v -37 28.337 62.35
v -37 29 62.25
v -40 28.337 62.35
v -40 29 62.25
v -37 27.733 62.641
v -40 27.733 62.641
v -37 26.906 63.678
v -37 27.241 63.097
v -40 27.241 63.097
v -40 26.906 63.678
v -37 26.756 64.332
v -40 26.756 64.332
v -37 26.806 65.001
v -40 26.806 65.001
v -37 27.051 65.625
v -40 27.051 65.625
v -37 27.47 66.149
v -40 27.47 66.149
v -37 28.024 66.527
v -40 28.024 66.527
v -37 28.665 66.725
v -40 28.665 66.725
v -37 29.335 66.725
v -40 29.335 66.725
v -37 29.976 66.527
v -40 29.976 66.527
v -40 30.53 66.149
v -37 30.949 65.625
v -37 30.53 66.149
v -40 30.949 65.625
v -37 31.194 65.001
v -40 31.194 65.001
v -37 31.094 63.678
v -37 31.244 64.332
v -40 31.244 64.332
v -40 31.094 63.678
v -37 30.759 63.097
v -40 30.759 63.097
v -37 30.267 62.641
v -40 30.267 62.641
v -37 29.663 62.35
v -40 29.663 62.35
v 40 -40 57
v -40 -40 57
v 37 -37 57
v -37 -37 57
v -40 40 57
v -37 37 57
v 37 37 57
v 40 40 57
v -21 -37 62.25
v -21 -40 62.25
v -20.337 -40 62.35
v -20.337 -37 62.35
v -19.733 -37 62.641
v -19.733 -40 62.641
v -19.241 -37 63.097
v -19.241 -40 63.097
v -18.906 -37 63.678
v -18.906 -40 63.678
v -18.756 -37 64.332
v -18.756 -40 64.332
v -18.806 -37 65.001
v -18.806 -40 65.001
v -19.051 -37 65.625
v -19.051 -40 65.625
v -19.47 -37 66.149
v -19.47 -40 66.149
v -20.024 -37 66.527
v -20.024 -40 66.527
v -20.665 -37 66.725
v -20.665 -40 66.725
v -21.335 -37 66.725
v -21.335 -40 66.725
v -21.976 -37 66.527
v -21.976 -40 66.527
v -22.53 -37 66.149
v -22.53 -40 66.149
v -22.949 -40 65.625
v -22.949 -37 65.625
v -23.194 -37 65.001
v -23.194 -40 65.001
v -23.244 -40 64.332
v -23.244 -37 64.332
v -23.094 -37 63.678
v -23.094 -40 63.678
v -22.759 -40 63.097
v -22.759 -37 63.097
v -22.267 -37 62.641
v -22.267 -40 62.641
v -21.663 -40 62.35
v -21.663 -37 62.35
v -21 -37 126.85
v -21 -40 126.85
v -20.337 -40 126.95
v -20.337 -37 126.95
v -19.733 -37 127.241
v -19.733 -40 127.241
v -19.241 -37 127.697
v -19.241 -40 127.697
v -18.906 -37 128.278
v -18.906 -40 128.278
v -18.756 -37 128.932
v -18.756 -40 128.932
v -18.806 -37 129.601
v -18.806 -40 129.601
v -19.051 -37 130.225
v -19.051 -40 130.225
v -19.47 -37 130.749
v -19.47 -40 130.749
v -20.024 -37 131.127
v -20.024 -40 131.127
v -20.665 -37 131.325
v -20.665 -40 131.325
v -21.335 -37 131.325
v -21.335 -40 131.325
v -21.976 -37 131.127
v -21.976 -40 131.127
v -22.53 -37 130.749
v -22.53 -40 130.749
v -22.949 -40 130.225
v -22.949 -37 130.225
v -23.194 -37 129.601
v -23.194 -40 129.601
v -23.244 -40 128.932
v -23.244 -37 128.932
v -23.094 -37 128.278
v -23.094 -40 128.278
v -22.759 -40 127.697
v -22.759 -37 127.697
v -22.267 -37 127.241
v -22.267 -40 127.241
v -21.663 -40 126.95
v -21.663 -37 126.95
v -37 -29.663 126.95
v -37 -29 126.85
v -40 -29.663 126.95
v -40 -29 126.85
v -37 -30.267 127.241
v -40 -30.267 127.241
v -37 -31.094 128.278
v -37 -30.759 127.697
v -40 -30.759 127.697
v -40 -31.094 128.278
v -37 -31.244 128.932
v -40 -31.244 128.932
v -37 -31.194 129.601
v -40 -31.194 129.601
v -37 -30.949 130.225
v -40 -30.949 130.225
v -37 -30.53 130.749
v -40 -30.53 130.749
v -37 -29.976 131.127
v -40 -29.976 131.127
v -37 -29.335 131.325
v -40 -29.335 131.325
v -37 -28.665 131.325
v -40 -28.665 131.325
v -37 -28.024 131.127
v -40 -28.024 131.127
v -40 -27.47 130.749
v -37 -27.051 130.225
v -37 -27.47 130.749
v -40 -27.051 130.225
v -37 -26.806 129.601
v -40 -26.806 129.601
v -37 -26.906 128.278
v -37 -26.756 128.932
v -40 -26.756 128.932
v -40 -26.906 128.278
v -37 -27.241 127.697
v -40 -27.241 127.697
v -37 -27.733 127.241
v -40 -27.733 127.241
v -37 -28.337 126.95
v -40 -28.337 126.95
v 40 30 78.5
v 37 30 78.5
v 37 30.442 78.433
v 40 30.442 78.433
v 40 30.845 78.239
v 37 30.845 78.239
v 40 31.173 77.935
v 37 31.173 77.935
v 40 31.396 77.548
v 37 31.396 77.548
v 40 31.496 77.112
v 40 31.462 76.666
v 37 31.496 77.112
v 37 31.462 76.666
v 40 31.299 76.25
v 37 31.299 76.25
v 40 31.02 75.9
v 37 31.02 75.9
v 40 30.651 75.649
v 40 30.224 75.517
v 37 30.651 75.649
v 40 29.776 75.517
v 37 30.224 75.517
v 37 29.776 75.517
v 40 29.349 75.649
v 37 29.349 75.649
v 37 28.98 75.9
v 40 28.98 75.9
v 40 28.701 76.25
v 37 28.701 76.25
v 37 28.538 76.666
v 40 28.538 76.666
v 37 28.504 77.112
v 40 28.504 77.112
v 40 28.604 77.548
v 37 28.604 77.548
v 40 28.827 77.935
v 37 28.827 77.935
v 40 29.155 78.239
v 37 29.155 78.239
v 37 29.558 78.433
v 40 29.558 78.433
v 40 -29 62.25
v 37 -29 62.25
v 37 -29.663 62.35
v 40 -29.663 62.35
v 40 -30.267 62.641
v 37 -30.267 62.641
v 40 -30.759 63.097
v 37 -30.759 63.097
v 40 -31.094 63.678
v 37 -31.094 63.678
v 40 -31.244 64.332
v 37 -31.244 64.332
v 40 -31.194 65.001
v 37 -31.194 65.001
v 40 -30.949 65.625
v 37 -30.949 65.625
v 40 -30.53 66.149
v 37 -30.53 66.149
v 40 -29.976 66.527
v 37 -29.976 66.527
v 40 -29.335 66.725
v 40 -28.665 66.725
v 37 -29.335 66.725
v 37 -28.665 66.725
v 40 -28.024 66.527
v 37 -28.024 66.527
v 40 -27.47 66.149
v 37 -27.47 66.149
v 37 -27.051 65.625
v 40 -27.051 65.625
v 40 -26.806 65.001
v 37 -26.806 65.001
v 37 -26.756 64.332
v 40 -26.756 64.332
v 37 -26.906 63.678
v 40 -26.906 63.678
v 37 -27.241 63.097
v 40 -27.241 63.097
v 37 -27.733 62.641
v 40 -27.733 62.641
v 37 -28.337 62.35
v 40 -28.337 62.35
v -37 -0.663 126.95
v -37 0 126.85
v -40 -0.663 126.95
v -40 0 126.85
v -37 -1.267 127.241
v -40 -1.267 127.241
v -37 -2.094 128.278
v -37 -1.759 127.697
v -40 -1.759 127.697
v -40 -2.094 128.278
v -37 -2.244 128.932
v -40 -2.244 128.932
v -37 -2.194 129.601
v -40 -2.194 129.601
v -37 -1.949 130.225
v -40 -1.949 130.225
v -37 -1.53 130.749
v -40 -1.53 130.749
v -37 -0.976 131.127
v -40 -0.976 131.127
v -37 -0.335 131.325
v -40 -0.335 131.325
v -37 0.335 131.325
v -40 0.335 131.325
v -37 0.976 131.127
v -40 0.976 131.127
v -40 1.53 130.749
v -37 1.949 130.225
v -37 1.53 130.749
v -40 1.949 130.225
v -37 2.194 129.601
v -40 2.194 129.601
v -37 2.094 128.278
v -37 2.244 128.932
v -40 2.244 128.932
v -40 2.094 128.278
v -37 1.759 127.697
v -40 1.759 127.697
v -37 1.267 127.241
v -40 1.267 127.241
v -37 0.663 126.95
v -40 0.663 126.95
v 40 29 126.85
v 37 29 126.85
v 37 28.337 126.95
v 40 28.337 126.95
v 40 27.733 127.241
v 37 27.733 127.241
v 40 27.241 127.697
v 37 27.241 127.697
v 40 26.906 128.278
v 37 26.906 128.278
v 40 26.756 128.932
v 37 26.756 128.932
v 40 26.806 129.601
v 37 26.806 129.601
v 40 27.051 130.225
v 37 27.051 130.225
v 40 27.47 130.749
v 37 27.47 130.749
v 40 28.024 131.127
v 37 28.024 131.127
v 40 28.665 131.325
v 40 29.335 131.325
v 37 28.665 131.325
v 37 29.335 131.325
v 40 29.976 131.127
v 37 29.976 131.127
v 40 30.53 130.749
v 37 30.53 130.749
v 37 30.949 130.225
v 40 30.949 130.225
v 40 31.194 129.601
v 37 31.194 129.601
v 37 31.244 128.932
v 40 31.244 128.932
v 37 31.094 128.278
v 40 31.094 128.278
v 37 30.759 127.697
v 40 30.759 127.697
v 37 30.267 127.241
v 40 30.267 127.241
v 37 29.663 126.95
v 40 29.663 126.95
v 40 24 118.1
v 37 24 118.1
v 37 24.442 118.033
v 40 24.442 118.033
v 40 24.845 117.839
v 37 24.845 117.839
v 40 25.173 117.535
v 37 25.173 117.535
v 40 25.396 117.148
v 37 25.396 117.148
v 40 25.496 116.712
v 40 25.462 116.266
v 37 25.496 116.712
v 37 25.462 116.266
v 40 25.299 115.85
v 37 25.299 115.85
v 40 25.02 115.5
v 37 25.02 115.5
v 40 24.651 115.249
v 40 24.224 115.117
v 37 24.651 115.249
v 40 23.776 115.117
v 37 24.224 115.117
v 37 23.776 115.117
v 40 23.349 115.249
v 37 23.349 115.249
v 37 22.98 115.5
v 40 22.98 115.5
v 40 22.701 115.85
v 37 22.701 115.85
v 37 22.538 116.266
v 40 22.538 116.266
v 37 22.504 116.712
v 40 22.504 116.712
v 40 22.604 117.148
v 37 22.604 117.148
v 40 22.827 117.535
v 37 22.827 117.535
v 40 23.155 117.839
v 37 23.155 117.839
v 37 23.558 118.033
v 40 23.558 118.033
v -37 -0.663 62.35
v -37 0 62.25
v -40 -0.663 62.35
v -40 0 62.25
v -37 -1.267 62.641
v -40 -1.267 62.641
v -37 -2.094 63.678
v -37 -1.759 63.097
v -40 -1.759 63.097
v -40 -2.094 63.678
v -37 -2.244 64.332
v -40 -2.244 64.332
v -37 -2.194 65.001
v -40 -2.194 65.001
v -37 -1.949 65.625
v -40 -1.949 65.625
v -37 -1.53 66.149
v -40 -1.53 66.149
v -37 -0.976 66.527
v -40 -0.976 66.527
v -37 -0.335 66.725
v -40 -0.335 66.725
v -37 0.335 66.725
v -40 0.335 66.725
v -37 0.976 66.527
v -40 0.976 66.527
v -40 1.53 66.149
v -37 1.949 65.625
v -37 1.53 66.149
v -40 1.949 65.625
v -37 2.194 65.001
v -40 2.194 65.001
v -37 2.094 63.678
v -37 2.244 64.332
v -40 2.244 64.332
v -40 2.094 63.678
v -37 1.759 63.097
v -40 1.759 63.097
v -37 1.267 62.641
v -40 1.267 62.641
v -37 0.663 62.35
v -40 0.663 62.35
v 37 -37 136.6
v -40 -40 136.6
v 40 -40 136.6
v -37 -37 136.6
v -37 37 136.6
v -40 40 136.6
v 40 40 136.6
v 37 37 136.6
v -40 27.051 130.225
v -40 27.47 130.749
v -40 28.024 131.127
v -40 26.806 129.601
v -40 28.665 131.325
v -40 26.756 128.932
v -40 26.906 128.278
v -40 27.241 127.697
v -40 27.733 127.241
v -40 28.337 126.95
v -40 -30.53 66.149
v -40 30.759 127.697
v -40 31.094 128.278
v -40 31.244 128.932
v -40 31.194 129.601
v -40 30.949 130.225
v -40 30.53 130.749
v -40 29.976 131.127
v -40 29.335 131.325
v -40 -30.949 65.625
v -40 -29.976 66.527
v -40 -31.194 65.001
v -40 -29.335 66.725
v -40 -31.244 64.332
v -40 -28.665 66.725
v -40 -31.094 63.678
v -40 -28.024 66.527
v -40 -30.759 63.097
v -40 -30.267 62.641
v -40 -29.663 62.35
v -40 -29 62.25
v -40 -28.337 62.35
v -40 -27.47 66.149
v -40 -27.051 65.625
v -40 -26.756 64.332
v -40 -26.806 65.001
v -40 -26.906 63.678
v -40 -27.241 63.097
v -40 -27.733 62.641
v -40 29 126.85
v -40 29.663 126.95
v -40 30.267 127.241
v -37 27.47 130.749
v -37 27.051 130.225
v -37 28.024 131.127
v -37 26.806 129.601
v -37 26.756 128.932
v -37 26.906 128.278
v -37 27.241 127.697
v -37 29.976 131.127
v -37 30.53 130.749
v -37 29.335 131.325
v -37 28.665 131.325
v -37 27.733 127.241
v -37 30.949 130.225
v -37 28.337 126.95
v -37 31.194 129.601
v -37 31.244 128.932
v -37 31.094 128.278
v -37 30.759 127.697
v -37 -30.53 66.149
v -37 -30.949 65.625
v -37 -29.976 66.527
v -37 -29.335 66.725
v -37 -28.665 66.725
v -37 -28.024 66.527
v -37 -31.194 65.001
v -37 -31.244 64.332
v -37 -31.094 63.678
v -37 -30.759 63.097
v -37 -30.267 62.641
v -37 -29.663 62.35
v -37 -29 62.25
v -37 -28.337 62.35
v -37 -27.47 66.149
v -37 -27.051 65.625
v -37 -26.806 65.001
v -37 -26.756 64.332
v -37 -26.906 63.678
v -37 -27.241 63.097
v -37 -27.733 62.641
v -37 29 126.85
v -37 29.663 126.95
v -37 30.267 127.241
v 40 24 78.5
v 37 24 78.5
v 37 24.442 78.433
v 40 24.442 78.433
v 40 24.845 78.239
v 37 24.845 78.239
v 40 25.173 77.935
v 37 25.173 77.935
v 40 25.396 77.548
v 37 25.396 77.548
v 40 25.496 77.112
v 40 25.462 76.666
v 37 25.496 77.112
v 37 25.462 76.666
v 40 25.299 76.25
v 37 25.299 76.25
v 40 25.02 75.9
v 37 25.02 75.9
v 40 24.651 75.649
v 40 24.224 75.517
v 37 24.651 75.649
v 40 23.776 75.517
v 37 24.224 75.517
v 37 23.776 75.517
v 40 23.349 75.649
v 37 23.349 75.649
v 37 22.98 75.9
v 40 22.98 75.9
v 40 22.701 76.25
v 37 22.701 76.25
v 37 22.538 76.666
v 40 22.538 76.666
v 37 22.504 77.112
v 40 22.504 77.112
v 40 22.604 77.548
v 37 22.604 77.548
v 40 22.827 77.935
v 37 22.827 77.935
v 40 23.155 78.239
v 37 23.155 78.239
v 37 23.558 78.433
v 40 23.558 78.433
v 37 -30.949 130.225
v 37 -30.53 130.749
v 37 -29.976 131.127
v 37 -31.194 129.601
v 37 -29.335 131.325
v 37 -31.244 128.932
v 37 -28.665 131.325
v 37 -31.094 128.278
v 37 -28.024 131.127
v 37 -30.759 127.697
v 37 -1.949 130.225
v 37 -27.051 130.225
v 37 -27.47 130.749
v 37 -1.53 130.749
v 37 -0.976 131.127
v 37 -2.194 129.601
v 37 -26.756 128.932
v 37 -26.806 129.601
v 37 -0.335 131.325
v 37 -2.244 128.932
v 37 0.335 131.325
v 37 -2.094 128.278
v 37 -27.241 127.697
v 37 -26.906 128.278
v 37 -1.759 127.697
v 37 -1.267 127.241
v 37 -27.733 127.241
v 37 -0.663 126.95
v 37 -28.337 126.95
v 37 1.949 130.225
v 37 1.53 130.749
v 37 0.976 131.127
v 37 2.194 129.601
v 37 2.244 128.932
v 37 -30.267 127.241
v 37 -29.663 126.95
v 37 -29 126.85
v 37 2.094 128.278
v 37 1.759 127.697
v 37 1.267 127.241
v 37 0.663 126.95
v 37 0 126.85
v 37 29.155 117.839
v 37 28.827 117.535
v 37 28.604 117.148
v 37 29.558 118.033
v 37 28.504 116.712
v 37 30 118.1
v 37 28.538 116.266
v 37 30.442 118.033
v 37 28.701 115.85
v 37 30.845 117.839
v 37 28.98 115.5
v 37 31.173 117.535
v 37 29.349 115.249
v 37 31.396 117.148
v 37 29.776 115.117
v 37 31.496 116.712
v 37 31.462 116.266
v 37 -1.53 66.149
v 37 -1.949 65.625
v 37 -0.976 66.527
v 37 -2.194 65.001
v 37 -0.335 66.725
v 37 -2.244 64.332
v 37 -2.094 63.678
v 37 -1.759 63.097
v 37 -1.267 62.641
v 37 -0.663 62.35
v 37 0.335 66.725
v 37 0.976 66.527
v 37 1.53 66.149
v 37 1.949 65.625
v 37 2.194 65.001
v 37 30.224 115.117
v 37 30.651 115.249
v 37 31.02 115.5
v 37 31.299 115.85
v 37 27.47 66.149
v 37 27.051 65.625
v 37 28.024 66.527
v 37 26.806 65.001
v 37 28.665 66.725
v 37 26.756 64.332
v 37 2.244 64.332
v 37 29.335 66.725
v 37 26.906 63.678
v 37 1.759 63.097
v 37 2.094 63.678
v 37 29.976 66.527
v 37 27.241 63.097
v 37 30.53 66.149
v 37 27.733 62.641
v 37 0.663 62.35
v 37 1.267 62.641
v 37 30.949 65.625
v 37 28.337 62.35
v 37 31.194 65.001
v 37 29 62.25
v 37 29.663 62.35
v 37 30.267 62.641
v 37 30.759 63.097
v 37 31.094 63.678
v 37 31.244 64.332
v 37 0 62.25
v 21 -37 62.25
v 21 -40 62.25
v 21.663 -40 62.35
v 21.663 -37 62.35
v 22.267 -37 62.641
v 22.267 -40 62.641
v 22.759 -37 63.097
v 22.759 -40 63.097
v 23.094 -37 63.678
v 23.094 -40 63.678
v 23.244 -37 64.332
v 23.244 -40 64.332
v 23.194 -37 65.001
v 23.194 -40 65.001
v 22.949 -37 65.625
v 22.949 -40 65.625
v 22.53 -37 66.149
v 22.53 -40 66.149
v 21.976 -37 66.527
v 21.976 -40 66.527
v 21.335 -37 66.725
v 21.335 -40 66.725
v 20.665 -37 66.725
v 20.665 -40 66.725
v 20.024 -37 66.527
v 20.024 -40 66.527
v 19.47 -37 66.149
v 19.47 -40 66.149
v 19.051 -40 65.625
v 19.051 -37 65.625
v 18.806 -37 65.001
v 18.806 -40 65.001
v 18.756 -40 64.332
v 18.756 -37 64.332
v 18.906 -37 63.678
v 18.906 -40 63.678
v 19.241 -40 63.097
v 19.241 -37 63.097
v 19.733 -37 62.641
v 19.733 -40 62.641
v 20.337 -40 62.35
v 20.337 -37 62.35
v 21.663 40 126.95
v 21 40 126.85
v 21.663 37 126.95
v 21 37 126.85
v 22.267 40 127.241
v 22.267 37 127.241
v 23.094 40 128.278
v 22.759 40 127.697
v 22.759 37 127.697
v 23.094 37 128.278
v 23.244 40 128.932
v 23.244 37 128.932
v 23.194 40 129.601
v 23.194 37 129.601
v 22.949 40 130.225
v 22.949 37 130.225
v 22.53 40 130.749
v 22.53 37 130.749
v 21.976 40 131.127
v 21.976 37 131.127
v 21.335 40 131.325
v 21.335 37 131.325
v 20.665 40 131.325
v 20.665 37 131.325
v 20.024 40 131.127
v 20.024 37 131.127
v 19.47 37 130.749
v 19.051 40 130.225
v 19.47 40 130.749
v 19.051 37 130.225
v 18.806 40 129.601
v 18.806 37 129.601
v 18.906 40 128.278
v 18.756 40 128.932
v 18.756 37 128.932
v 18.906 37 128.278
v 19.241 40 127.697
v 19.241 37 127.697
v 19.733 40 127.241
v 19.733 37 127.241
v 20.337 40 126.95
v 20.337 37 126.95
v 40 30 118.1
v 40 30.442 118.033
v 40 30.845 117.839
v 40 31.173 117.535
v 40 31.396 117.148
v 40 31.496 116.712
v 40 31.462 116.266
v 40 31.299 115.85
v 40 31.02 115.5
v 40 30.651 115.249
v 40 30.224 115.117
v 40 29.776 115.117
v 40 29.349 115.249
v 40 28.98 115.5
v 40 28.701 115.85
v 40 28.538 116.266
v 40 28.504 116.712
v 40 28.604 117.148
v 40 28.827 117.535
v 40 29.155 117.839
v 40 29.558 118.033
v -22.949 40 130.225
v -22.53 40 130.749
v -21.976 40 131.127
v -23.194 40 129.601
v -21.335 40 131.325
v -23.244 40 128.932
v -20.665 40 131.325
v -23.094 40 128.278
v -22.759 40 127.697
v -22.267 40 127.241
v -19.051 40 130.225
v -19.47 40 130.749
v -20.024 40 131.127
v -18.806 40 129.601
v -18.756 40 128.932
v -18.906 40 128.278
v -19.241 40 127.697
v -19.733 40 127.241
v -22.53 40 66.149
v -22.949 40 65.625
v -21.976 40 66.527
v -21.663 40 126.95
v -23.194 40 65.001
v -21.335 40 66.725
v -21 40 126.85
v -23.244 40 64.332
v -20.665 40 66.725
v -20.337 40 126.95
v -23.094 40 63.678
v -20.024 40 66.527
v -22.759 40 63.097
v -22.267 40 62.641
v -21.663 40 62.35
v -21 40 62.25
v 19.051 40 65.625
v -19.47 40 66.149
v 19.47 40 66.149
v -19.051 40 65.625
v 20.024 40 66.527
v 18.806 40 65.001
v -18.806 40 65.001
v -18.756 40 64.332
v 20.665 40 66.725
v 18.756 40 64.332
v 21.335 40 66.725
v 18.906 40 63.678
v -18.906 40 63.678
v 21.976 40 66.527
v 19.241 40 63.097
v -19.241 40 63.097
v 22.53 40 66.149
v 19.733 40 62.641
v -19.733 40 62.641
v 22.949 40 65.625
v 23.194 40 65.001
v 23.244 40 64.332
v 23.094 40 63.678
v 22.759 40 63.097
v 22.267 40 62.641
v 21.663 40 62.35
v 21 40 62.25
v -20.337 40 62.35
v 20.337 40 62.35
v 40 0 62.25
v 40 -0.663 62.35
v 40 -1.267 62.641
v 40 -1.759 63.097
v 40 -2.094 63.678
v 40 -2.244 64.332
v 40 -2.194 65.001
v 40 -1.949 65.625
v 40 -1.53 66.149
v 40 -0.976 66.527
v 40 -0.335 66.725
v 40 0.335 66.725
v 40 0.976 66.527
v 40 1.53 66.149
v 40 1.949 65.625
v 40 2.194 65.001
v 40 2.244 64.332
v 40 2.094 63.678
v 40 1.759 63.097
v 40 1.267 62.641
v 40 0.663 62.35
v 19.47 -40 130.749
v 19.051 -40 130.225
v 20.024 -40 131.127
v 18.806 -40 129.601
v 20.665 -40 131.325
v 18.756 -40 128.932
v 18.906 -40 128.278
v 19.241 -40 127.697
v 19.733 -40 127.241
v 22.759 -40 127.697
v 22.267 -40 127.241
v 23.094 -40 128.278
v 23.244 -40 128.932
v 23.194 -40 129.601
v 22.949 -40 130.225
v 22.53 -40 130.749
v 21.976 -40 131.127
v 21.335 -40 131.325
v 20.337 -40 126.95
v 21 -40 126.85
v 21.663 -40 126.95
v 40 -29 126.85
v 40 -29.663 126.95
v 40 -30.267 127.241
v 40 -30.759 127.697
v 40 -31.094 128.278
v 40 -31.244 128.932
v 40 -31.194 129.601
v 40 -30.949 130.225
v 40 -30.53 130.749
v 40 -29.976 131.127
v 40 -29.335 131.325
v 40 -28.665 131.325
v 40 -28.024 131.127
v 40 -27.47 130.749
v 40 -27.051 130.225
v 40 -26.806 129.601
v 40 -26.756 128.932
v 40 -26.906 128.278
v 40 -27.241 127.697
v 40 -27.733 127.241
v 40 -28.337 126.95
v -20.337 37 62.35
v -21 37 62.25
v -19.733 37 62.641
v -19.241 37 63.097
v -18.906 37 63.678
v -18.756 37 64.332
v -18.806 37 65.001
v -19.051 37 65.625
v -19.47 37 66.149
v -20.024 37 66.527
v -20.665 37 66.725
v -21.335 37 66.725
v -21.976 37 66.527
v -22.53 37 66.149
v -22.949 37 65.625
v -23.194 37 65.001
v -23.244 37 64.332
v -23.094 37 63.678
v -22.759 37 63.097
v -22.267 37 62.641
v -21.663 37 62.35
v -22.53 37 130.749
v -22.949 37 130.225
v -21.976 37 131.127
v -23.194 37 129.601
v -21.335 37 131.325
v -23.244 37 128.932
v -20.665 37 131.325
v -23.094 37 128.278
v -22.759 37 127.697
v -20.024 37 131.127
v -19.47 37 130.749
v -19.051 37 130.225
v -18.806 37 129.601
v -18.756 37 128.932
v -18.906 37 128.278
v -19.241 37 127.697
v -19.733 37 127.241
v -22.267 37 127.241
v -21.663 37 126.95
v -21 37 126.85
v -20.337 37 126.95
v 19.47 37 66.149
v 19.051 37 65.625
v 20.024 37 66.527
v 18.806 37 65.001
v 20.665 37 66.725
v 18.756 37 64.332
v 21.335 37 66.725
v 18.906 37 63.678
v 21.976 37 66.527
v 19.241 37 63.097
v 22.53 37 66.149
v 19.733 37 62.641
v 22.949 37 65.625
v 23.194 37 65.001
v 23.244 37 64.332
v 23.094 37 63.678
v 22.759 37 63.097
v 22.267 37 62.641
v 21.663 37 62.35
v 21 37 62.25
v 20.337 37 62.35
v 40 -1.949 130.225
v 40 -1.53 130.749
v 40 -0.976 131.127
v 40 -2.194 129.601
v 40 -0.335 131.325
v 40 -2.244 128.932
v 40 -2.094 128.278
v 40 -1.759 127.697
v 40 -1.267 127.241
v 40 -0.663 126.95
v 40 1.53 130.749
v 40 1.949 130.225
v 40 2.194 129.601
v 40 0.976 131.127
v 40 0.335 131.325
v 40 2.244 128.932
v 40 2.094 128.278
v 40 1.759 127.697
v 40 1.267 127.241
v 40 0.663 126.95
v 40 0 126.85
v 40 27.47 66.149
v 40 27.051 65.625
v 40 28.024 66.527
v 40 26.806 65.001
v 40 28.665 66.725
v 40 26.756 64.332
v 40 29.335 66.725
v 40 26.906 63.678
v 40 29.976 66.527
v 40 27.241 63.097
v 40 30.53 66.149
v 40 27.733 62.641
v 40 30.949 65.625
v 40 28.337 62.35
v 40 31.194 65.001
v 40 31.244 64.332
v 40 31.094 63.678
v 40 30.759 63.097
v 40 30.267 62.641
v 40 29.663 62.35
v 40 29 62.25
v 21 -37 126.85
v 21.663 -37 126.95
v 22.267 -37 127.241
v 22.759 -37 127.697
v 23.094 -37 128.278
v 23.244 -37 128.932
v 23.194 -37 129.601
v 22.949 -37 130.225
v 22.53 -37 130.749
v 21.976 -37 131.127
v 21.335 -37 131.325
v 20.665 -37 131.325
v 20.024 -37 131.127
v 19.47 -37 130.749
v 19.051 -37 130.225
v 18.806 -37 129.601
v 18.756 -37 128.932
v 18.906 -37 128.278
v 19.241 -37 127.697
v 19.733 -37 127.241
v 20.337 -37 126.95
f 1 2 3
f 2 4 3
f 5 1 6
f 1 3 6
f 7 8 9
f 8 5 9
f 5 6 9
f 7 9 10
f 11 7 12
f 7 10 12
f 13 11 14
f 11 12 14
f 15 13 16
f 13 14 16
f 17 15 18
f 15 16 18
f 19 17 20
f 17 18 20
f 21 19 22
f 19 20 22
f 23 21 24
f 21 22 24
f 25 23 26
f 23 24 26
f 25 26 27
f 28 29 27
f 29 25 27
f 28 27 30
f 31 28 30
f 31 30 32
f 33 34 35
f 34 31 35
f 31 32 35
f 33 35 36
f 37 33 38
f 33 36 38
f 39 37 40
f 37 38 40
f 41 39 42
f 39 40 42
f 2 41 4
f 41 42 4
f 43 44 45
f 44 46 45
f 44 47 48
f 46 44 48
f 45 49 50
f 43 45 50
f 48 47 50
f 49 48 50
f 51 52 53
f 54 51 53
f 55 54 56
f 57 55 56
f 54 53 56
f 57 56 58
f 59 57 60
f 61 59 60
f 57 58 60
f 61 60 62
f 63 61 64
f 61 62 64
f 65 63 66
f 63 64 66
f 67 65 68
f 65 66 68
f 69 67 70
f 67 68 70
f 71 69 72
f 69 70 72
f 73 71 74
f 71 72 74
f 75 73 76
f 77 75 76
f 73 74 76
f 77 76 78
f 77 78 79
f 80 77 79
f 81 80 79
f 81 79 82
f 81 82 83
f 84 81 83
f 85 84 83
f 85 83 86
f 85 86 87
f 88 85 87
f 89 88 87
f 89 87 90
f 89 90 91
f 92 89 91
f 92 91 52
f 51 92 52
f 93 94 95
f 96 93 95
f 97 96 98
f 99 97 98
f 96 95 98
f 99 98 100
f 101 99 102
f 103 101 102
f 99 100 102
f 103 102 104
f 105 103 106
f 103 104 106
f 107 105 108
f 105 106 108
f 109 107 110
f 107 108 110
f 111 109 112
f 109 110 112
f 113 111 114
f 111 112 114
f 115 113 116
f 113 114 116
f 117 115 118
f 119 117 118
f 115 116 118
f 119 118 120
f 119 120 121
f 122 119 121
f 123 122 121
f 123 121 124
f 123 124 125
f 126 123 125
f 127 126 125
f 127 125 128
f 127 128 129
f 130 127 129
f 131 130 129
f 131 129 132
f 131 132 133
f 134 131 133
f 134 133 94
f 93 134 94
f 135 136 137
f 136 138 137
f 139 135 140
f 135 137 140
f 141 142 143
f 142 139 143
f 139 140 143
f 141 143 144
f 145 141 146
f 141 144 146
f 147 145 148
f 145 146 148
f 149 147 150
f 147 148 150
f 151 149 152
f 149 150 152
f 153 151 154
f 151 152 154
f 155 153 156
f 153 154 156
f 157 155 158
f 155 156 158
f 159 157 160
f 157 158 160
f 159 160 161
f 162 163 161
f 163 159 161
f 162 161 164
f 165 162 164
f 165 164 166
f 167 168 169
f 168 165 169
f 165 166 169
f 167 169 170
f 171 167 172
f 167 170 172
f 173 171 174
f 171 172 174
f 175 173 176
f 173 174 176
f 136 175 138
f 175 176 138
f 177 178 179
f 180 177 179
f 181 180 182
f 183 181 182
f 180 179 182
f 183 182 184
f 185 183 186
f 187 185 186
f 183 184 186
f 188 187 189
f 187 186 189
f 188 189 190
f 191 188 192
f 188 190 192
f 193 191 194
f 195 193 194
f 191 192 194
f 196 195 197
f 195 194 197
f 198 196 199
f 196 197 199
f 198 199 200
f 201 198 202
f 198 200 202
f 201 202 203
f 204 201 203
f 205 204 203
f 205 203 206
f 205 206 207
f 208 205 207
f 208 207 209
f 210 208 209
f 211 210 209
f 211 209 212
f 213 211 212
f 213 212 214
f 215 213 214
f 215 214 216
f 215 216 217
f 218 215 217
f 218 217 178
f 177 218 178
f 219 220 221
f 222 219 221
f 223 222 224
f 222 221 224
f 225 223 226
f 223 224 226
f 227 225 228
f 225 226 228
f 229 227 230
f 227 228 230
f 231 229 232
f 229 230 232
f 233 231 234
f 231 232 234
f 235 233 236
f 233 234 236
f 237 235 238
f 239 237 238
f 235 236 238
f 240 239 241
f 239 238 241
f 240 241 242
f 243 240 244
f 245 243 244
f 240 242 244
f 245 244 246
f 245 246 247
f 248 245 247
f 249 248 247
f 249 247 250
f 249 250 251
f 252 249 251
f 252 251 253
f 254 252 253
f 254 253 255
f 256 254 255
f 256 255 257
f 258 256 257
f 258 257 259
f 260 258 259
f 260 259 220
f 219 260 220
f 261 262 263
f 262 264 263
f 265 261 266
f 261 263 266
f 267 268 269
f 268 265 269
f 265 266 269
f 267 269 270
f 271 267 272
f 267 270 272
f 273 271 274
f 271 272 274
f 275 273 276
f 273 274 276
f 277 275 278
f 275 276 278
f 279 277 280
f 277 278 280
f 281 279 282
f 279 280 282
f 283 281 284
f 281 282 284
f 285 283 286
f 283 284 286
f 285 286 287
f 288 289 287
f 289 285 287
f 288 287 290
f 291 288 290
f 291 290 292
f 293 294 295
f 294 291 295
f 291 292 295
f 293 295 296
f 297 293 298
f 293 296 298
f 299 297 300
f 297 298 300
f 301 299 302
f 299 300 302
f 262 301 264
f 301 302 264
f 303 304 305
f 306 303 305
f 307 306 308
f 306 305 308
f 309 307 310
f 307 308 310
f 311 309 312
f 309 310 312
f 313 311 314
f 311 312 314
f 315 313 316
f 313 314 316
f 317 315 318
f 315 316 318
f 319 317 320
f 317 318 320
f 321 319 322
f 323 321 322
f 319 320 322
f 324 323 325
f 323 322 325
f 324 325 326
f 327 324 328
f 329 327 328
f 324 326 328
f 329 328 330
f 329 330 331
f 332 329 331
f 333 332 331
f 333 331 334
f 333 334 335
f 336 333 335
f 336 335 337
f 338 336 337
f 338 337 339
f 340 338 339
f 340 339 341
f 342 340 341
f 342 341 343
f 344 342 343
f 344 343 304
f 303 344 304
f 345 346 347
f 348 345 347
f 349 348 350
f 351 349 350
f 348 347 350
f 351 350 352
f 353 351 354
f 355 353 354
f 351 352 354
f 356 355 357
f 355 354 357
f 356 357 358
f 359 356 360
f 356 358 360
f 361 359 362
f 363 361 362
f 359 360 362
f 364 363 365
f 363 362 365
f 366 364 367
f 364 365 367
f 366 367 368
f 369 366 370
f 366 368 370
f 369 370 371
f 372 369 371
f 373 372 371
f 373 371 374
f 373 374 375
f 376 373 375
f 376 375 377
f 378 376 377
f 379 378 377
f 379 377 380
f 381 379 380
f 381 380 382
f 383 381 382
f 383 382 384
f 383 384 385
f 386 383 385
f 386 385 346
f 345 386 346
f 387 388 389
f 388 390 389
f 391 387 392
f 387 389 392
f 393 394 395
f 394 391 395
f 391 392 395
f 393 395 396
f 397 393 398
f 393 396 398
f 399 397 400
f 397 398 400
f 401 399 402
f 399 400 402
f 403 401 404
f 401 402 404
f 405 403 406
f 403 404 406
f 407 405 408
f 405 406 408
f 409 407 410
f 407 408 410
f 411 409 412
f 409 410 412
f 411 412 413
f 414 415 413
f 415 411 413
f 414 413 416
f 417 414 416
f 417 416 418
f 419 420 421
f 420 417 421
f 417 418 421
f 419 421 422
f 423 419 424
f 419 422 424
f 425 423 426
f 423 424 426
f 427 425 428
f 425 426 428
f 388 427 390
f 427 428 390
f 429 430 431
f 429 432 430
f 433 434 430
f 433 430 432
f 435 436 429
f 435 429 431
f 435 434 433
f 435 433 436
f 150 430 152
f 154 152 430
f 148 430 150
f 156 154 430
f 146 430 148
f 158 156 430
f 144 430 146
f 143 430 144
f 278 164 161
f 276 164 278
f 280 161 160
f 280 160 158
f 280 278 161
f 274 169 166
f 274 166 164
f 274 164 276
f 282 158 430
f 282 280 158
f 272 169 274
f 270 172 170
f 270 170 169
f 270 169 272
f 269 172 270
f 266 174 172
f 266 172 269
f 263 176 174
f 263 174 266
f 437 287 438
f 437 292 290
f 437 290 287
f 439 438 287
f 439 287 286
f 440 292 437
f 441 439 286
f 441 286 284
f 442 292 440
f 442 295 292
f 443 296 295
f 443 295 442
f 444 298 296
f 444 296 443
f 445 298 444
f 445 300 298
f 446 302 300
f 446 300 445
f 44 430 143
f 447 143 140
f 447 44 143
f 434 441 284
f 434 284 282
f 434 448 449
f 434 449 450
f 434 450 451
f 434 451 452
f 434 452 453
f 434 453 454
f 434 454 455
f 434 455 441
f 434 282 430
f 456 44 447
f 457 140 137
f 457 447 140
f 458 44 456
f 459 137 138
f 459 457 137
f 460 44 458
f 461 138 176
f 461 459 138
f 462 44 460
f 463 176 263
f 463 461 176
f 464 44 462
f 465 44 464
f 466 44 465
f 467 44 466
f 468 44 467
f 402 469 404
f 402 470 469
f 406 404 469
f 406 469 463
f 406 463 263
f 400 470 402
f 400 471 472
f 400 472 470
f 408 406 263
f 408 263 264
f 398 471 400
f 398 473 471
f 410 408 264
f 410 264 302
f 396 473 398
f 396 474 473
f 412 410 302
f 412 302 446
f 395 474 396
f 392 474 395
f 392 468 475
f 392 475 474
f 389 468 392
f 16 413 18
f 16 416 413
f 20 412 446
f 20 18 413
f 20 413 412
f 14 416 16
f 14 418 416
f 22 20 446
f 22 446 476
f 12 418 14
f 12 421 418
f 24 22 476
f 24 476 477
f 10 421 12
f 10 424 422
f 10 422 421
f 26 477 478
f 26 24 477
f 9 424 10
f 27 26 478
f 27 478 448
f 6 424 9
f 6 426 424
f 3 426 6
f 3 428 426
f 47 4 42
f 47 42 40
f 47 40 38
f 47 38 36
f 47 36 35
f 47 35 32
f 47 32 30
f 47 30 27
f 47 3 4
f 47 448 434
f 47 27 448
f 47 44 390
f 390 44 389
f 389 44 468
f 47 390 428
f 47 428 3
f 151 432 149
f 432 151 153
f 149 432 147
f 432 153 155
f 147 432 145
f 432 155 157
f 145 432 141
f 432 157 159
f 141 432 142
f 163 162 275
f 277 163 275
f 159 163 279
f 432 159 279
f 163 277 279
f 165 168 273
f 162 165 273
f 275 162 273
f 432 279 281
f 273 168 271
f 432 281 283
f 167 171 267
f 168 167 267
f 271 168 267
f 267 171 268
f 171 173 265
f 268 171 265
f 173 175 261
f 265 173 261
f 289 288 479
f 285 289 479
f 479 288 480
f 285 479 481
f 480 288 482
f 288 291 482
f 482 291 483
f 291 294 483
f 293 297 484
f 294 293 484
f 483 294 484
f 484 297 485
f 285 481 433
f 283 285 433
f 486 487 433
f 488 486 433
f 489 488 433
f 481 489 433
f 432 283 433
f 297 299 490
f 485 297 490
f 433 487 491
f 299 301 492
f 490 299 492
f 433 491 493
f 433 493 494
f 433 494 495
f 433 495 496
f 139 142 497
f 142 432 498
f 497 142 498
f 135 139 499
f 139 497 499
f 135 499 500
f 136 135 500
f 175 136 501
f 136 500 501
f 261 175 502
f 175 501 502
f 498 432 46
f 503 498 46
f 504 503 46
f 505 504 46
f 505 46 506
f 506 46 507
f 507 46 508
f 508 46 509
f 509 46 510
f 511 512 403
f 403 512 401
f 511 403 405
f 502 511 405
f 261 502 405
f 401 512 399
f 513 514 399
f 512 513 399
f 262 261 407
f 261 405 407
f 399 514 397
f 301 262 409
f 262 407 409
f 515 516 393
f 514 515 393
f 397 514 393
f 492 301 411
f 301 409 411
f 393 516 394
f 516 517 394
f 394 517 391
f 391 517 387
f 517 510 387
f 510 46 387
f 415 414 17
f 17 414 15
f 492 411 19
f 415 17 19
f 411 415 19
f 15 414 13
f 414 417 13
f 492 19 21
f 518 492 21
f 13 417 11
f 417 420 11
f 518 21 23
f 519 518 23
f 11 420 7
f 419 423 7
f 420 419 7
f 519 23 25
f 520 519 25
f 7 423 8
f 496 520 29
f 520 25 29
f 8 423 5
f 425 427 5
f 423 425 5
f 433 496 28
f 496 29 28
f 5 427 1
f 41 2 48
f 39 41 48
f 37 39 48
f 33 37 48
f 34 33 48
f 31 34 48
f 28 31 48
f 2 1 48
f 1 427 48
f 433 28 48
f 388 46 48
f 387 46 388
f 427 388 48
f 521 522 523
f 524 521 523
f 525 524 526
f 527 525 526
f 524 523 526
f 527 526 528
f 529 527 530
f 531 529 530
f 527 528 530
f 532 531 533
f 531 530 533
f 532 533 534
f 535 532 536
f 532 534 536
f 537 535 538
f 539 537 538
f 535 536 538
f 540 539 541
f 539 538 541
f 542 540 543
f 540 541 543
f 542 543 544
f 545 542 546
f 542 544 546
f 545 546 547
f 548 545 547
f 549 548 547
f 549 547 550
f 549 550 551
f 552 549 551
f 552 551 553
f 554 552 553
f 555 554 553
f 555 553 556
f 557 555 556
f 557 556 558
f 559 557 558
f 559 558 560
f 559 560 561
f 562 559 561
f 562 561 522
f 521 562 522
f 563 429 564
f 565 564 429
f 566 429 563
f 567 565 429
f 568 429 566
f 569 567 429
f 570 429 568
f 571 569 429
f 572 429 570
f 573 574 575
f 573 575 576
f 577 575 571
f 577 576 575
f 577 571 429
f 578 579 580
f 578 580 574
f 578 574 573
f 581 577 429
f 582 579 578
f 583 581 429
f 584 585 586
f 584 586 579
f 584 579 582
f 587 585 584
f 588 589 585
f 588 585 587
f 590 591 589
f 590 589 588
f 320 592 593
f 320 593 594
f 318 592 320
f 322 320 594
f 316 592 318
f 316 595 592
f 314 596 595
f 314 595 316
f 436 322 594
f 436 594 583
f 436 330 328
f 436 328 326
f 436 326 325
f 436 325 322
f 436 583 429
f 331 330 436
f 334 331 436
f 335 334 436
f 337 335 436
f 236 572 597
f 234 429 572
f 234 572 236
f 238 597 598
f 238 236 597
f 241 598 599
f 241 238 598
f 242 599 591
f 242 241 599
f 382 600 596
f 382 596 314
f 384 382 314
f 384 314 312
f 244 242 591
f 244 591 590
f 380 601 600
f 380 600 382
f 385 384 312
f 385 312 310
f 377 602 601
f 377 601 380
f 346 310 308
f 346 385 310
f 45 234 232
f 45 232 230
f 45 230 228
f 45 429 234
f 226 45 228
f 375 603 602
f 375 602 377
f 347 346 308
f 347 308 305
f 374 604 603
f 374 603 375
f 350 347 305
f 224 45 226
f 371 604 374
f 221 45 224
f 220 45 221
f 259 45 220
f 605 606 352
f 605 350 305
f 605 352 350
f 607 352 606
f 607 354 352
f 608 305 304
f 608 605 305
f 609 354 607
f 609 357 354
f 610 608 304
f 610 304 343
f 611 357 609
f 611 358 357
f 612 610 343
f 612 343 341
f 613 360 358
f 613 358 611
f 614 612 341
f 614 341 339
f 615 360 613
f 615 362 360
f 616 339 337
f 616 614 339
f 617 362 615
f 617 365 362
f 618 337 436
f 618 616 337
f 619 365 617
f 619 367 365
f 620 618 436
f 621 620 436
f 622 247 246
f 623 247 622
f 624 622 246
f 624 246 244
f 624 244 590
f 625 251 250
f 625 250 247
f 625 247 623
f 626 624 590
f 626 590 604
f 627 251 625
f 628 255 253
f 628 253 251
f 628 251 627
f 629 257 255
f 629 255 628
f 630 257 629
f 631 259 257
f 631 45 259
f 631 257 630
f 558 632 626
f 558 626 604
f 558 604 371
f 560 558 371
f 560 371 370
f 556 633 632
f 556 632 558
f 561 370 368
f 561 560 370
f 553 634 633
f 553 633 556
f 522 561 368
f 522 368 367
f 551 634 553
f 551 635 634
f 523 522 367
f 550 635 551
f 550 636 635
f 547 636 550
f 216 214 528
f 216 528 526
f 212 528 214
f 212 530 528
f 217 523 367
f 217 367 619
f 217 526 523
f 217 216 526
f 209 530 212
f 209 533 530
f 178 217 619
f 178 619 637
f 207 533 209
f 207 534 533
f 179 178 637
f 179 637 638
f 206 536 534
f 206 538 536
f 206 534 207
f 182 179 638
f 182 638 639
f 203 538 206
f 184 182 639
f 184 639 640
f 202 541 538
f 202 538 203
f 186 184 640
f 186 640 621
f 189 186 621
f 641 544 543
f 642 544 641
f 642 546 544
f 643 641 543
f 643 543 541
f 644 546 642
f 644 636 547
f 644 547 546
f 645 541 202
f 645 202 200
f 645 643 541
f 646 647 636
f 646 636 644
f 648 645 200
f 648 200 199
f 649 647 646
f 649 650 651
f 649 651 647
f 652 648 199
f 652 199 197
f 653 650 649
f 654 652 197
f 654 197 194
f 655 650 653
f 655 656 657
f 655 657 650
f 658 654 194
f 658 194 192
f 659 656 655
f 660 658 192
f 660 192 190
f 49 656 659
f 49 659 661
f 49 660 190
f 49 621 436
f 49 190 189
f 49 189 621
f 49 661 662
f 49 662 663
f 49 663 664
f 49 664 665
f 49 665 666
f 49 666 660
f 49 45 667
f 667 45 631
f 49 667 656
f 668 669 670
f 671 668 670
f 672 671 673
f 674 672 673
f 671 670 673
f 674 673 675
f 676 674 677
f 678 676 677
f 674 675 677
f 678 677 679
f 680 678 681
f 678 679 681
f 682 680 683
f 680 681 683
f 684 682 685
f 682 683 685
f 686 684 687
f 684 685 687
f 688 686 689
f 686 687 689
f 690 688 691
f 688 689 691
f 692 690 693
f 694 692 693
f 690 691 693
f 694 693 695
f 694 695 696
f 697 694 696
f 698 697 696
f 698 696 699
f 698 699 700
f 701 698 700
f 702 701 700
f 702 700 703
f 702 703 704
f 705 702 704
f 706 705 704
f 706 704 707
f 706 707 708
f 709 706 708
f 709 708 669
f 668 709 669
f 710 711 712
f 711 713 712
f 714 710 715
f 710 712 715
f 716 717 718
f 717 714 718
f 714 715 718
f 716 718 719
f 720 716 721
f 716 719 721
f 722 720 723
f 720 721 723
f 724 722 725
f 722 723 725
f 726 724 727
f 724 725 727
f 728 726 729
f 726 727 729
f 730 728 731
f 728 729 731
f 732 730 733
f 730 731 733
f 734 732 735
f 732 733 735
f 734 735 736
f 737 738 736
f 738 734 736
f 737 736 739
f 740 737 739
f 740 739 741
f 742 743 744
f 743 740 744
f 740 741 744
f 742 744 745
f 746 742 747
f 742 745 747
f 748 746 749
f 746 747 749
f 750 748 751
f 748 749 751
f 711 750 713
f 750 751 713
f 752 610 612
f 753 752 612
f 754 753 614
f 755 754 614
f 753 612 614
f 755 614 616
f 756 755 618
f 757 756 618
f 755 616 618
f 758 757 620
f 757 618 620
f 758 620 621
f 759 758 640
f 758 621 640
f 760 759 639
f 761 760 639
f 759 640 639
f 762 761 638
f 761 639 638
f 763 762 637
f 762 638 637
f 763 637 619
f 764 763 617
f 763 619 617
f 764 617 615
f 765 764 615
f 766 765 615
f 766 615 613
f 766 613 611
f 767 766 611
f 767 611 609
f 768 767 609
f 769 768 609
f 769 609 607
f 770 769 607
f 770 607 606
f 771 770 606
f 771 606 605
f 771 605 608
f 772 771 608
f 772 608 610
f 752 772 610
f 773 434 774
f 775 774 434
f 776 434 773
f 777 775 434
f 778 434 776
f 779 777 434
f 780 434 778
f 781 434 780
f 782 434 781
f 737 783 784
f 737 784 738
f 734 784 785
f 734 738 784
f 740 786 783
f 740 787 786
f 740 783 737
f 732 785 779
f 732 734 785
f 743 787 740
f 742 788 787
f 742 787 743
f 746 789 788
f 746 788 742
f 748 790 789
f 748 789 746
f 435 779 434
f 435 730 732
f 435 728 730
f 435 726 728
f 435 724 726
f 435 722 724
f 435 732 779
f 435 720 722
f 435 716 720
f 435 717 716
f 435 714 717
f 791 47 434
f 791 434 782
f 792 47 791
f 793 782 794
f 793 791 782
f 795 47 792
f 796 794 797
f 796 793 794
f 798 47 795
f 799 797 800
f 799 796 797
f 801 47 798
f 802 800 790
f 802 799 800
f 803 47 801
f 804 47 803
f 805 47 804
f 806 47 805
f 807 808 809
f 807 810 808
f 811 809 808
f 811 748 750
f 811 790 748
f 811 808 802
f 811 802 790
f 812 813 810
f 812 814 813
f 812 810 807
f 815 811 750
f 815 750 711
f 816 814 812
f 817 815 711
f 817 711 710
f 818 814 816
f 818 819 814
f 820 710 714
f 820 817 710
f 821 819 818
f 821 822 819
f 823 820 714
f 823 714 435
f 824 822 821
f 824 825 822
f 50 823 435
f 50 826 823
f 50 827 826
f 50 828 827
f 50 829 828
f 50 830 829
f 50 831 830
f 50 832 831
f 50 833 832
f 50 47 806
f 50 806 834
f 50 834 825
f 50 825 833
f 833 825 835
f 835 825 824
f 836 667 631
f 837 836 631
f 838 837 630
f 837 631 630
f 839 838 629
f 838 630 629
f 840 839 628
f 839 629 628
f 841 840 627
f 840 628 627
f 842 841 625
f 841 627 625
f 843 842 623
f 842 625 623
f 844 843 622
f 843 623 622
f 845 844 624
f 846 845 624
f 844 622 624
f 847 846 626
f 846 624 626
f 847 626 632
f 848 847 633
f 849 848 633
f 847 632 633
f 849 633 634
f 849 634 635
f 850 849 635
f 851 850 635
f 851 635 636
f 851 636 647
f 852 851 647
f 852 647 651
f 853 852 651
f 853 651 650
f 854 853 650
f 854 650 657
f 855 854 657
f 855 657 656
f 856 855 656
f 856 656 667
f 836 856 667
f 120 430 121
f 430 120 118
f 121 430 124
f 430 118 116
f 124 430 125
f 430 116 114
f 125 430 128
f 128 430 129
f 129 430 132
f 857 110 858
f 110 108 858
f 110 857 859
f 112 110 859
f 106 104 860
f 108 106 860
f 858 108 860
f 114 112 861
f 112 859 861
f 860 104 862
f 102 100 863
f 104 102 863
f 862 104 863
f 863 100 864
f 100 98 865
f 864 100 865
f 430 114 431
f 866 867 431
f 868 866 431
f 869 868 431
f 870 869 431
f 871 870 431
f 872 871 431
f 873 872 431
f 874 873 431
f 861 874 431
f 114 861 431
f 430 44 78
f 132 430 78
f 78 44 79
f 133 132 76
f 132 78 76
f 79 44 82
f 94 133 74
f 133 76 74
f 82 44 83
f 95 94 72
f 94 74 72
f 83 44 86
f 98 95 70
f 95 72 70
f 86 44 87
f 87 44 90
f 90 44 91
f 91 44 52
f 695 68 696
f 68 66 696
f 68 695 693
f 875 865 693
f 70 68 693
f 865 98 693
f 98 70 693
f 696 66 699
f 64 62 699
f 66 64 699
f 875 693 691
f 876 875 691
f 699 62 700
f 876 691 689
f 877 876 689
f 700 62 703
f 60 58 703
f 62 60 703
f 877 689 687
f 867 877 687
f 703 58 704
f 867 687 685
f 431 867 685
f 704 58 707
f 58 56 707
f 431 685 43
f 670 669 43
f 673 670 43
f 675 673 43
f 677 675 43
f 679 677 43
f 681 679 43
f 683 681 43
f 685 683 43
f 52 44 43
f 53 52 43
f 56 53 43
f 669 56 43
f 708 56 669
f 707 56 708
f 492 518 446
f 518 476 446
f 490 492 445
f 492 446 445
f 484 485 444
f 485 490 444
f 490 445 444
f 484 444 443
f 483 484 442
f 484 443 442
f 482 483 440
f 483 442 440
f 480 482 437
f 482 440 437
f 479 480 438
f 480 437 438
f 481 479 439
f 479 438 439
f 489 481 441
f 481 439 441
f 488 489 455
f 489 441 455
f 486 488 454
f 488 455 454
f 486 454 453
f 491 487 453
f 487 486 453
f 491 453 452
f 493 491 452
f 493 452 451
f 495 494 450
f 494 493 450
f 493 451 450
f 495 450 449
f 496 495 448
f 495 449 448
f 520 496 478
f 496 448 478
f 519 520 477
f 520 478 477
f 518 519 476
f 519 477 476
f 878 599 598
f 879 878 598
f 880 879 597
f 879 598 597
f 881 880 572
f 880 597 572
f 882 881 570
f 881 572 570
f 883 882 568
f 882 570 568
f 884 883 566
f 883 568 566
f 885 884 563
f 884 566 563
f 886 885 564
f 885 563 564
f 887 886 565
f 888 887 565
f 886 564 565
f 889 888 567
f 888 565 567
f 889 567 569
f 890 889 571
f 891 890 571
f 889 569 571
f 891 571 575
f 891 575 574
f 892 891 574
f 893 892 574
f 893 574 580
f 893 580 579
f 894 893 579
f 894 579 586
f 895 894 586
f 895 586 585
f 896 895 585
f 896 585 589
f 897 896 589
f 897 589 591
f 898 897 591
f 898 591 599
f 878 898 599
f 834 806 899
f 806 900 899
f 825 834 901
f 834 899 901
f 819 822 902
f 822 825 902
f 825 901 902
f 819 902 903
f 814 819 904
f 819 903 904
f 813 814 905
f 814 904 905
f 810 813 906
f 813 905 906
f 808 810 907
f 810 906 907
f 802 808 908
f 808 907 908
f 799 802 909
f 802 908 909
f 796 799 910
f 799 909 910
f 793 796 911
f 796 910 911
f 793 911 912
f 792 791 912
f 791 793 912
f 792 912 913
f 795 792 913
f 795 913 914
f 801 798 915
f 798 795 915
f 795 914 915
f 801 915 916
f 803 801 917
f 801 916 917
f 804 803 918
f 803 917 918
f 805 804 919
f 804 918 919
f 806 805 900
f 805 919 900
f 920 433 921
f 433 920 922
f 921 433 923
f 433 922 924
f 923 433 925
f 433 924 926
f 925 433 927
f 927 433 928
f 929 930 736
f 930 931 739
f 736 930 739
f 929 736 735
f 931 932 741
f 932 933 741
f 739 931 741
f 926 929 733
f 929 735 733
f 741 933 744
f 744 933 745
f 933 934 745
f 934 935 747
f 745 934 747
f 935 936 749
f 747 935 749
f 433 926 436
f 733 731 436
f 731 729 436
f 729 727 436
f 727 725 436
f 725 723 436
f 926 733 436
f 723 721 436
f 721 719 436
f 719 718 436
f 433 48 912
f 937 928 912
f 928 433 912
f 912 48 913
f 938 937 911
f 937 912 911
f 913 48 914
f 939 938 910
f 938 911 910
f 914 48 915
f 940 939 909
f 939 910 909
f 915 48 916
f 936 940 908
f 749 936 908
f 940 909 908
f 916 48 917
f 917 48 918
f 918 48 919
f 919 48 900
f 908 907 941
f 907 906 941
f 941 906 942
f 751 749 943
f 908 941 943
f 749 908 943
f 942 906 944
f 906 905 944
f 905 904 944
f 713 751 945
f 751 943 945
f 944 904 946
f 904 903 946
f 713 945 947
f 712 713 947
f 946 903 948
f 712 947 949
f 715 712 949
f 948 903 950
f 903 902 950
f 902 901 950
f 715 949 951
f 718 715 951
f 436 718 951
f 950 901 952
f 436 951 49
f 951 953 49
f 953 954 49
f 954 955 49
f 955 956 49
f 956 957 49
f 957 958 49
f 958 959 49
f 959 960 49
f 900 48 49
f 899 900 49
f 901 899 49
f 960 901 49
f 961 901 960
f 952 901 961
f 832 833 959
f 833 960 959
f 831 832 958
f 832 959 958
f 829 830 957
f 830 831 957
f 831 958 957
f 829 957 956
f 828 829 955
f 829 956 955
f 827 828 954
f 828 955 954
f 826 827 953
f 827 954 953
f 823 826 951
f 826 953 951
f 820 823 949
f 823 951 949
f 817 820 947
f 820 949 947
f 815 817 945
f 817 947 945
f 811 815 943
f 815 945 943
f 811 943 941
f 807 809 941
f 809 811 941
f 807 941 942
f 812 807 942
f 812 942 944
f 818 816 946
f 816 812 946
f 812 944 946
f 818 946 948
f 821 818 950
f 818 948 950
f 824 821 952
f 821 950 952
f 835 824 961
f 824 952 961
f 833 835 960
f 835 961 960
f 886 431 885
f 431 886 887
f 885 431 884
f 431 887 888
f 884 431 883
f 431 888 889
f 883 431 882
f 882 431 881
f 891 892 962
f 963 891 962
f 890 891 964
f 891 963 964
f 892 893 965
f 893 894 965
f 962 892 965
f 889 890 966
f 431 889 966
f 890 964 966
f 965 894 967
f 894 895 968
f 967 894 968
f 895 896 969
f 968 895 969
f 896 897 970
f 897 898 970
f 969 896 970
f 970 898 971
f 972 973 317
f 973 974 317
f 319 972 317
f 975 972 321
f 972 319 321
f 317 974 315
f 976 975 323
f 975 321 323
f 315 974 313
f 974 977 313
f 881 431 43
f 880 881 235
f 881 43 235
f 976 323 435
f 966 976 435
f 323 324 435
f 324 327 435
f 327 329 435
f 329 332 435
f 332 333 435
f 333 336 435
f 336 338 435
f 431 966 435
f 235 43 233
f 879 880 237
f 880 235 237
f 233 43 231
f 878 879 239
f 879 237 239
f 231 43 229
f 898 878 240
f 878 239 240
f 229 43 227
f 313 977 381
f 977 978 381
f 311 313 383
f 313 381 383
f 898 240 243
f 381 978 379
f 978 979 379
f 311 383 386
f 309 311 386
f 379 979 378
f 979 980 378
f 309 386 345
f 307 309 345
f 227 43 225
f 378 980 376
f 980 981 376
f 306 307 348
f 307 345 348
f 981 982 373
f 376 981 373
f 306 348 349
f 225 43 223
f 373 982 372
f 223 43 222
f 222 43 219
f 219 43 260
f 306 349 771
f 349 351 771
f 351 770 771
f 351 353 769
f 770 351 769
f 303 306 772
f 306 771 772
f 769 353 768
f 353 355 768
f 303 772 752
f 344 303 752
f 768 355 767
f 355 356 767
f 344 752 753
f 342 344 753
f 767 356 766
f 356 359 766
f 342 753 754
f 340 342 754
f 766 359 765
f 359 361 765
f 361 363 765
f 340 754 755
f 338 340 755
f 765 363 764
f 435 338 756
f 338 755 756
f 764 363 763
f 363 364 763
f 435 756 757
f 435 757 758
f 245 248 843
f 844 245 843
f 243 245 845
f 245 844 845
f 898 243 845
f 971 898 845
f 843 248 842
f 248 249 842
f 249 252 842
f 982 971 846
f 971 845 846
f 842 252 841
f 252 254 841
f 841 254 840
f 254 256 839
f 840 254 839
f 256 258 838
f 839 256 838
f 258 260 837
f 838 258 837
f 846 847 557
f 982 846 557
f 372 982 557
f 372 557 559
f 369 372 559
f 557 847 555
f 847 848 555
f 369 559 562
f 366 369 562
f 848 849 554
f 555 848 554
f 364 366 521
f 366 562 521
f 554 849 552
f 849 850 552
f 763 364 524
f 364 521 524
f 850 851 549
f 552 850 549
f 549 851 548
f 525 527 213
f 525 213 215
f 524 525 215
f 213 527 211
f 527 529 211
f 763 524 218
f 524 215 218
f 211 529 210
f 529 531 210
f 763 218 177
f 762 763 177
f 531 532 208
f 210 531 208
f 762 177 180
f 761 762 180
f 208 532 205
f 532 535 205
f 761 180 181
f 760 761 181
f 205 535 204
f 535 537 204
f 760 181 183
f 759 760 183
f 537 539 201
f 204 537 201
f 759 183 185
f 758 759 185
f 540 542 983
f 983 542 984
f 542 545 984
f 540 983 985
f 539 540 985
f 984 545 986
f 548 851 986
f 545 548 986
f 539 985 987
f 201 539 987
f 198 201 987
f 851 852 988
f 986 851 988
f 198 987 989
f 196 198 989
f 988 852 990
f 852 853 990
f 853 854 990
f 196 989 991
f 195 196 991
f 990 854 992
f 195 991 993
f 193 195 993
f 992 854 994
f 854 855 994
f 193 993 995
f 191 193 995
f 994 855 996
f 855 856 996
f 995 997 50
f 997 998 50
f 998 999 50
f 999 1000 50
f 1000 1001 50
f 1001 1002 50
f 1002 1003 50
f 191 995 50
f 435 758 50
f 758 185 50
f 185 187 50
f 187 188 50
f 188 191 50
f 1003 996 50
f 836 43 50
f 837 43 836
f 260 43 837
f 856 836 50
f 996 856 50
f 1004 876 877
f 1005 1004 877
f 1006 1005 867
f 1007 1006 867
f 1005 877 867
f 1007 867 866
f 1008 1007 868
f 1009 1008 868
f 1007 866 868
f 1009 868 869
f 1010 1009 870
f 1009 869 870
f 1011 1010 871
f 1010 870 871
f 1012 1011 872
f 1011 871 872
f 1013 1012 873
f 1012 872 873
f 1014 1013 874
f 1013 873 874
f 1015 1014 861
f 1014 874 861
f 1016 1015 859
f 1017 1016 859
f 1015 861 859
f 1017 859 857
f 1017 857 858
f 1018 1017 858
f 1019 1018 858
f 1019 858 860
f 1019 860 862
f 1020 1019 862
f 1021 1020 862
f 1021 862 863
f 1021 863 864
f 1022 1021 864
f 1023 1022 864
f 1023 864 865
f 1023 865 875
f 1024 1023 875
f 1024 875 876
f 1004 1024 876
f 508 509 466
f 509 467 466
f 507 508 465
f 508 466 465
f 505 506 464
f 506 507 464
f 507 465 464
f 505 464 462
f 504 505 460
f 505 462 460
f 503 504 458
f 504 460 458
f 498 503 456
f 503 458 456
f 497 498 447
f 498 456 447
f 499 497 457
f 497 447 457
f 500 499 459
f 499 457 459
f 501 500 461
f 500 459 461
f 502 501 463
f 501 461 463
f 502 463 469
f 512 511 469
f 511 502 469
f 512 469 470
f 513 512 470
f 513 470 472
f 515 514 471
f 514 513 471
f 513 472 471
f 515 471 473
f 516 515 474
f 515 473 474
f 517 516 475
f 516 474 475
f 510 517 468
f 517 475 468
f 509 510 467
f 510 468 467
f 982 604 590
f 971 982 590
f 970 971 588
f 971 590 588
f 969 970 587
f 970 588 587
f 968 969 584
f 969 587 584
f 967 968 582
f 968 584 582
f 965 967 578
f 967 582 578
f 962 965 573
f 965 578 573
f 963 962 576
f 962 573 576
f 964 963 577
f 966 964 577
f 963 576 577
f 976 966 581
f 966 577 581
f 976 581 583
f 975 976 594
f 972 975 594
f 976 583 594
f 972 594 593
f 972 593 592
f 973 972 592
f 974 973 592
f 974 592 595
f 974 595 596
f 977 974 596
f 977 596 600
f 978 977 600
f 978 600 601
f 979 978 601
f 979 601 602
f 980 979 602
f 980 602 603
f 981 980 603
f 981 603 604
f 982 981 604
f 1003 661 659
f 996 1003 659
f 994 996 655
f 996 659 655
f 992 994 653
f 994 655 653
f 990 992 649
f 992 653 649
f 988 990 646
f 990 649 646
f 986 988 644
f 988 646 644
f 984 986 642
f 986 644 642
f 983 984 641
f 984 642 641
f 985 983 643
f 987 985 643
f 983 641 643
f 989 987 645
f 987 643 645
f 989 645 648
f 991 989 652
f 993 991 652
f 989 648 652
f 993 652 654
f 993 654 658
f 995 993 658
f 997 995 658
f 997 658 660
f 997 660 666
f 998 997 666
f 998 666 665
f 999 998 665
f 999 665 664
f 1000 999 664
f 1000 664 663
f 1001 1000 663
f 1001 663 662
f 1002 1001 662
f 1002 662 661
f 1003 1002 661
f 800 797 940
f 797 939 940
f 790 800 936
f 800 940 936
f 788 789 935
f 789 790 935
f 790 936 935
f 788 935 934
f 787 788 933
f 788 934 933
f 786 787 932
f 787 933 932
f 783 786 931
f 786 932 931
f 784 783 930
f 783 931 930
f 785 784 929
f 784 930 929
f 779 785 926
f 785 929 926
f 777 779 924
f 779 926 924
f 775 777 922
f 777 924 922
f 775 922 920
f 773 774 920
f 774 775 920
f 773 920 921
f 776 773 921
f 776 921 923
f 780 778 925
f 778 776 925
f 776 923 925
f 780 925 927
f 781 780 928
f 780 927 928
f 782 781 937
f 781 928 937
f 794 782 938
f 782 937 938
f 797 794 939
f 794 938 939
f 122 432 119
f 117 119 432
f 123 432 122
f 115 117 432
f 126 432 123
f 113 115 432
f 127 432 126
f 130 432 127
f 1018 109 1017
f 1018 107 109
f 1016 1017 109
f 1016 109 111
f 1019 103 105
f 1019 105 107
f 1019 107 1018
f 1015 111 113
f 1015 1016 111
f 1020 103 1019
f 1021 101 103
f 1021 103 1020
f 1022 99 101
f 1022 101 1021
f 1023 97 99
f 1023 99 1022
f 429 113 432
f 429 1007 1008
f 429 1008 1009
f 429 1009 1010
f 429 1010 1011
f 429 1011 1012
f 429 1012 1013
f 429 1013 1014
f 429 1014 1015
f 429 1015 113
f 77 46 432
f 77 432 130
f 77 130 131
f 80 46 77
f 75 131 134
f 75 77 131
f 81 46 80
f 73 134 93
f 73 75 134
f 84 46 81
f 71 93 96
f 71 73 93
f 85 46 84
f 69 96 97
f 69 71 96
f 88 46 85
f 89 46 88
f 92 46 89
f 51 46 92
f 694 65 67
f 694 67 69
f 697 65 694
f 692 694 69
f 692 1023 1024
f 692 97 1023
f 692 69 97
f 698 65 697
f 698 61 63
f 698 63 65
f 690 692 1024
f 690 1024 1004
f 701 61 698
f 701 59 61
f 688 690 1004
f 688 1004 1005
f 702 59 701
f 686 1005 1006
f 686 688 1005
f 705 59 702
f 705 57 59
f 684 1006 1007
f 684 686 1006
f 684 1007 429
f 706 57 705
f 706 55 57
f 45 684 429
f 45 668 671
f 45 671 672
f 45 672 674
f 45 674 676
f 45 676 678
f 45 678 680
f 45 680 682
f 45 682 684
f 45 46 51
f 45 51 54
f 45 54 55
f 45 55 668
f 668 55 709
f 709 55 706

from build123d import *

# Parameters (mm, degrees)
SKETCH1_W                      = 80
SKETCH1_H                      = 80
SKETCH1_W_2                    = 74
SKETCH1_H_2                    = 74
BOSS_EXTRUDE1_DEPTH            = 79.6
M4_CLEARANCE_HOLE1_D           = 4.5
M4_CLEARANCE_HOLE1_ON_FACE_2_D = 4.5
M4_CLEARANCE_HOLE1_ON_FACE_3_D = 4.5
M4_CLEARANCE_HOLE1_ON_FACE_4_D = 4.5
F_3_0_3_DIAMETER_HOLE1_D       = 3
F_3_0_3_DIAMETER_HOLE1_DEPTH   = 3


with BuildPart() as part:
    # Sketch1 → Boss-Extrude1 (new body)
    with BuildSketch(Plane.XY.offset(57)):
        Rectangle(SKETCH1_W, SKETCH1_H)
        Rectangle(SKETCH1_W_2, SKETCH1_H_2, mode=Mode.SUBTRACT)
    extrude(amount=BOSS_EXTRUDE1_DEPTH)

    # M4 Clearance Hole1 (through all)
    with Locations(Plane(origin=(40, 29, 64.5), x_dir=(0, 0, 1), z_dir=(1, 0, 0))):
        with Locations((0, 0), (0, 58), (0, 29), (64.6, 0), (64.6, 29), (64.6, 58)):
            Hole(M4_CLEARANCE_HOLE1_D / 2)

    # M4 Clearance Hole1 on face 2 (through all)
    with Locations(Plane(origin=(21, 40, 64.5), x_dir=(0, 0, 1), z_dir=(0, 1, 0))):
        with Locations((0, 0), (0, -42), (64.6, -42), (64.6, 0)):
            Hole(M4_CLEARANCE_HOLE1_ON_FACE_2_D / 2)

    # M4 Clearance Hole1 on face 3 (through all)
    with Locations(Plane(origin=(-40, 29, 64.5), x_dir=(0, 0, -1), z_dir=(-1, 0, 0))):
        with Locations((0, 0), (0, 29), (0, 58), (-64.6, 58), (-64.6, 29), (-64.6, 0)):
            Hole(M4_CLEARANCE_HOLE1_ON_FACE_3_D / 2)

    # M4 Clearance Hole1 on face 4 (through all)
    with Locations(Plane(origin=(21, -40, 64.5), x_dir=(0, 0, -1), z_dir=(0, -1, 0))):
        with Locations((0, 0), (0, -42), (-64.6, -42), (-64.6, 0)):
            Hole(M4_CLEARANCE_HOLE1_ON_FACE_4_D / 2)

    # Ø3.0 (3) Diameter Hole1
    with Locations(Plane(origin=(40, 0, 0), x_dir=(0, 0, -1), z_dir=(1, 0, 0))):
        with Locations((-77, 30), (-116.6, 24), (-116.6, 30), (-77, 24)):
            Hole(F_3_0_3_DIAMETER_HOLE1_D / 2, depth=F_3_0_3_DIAMETER_HOLE1_DEPTH)


solid = part.part
